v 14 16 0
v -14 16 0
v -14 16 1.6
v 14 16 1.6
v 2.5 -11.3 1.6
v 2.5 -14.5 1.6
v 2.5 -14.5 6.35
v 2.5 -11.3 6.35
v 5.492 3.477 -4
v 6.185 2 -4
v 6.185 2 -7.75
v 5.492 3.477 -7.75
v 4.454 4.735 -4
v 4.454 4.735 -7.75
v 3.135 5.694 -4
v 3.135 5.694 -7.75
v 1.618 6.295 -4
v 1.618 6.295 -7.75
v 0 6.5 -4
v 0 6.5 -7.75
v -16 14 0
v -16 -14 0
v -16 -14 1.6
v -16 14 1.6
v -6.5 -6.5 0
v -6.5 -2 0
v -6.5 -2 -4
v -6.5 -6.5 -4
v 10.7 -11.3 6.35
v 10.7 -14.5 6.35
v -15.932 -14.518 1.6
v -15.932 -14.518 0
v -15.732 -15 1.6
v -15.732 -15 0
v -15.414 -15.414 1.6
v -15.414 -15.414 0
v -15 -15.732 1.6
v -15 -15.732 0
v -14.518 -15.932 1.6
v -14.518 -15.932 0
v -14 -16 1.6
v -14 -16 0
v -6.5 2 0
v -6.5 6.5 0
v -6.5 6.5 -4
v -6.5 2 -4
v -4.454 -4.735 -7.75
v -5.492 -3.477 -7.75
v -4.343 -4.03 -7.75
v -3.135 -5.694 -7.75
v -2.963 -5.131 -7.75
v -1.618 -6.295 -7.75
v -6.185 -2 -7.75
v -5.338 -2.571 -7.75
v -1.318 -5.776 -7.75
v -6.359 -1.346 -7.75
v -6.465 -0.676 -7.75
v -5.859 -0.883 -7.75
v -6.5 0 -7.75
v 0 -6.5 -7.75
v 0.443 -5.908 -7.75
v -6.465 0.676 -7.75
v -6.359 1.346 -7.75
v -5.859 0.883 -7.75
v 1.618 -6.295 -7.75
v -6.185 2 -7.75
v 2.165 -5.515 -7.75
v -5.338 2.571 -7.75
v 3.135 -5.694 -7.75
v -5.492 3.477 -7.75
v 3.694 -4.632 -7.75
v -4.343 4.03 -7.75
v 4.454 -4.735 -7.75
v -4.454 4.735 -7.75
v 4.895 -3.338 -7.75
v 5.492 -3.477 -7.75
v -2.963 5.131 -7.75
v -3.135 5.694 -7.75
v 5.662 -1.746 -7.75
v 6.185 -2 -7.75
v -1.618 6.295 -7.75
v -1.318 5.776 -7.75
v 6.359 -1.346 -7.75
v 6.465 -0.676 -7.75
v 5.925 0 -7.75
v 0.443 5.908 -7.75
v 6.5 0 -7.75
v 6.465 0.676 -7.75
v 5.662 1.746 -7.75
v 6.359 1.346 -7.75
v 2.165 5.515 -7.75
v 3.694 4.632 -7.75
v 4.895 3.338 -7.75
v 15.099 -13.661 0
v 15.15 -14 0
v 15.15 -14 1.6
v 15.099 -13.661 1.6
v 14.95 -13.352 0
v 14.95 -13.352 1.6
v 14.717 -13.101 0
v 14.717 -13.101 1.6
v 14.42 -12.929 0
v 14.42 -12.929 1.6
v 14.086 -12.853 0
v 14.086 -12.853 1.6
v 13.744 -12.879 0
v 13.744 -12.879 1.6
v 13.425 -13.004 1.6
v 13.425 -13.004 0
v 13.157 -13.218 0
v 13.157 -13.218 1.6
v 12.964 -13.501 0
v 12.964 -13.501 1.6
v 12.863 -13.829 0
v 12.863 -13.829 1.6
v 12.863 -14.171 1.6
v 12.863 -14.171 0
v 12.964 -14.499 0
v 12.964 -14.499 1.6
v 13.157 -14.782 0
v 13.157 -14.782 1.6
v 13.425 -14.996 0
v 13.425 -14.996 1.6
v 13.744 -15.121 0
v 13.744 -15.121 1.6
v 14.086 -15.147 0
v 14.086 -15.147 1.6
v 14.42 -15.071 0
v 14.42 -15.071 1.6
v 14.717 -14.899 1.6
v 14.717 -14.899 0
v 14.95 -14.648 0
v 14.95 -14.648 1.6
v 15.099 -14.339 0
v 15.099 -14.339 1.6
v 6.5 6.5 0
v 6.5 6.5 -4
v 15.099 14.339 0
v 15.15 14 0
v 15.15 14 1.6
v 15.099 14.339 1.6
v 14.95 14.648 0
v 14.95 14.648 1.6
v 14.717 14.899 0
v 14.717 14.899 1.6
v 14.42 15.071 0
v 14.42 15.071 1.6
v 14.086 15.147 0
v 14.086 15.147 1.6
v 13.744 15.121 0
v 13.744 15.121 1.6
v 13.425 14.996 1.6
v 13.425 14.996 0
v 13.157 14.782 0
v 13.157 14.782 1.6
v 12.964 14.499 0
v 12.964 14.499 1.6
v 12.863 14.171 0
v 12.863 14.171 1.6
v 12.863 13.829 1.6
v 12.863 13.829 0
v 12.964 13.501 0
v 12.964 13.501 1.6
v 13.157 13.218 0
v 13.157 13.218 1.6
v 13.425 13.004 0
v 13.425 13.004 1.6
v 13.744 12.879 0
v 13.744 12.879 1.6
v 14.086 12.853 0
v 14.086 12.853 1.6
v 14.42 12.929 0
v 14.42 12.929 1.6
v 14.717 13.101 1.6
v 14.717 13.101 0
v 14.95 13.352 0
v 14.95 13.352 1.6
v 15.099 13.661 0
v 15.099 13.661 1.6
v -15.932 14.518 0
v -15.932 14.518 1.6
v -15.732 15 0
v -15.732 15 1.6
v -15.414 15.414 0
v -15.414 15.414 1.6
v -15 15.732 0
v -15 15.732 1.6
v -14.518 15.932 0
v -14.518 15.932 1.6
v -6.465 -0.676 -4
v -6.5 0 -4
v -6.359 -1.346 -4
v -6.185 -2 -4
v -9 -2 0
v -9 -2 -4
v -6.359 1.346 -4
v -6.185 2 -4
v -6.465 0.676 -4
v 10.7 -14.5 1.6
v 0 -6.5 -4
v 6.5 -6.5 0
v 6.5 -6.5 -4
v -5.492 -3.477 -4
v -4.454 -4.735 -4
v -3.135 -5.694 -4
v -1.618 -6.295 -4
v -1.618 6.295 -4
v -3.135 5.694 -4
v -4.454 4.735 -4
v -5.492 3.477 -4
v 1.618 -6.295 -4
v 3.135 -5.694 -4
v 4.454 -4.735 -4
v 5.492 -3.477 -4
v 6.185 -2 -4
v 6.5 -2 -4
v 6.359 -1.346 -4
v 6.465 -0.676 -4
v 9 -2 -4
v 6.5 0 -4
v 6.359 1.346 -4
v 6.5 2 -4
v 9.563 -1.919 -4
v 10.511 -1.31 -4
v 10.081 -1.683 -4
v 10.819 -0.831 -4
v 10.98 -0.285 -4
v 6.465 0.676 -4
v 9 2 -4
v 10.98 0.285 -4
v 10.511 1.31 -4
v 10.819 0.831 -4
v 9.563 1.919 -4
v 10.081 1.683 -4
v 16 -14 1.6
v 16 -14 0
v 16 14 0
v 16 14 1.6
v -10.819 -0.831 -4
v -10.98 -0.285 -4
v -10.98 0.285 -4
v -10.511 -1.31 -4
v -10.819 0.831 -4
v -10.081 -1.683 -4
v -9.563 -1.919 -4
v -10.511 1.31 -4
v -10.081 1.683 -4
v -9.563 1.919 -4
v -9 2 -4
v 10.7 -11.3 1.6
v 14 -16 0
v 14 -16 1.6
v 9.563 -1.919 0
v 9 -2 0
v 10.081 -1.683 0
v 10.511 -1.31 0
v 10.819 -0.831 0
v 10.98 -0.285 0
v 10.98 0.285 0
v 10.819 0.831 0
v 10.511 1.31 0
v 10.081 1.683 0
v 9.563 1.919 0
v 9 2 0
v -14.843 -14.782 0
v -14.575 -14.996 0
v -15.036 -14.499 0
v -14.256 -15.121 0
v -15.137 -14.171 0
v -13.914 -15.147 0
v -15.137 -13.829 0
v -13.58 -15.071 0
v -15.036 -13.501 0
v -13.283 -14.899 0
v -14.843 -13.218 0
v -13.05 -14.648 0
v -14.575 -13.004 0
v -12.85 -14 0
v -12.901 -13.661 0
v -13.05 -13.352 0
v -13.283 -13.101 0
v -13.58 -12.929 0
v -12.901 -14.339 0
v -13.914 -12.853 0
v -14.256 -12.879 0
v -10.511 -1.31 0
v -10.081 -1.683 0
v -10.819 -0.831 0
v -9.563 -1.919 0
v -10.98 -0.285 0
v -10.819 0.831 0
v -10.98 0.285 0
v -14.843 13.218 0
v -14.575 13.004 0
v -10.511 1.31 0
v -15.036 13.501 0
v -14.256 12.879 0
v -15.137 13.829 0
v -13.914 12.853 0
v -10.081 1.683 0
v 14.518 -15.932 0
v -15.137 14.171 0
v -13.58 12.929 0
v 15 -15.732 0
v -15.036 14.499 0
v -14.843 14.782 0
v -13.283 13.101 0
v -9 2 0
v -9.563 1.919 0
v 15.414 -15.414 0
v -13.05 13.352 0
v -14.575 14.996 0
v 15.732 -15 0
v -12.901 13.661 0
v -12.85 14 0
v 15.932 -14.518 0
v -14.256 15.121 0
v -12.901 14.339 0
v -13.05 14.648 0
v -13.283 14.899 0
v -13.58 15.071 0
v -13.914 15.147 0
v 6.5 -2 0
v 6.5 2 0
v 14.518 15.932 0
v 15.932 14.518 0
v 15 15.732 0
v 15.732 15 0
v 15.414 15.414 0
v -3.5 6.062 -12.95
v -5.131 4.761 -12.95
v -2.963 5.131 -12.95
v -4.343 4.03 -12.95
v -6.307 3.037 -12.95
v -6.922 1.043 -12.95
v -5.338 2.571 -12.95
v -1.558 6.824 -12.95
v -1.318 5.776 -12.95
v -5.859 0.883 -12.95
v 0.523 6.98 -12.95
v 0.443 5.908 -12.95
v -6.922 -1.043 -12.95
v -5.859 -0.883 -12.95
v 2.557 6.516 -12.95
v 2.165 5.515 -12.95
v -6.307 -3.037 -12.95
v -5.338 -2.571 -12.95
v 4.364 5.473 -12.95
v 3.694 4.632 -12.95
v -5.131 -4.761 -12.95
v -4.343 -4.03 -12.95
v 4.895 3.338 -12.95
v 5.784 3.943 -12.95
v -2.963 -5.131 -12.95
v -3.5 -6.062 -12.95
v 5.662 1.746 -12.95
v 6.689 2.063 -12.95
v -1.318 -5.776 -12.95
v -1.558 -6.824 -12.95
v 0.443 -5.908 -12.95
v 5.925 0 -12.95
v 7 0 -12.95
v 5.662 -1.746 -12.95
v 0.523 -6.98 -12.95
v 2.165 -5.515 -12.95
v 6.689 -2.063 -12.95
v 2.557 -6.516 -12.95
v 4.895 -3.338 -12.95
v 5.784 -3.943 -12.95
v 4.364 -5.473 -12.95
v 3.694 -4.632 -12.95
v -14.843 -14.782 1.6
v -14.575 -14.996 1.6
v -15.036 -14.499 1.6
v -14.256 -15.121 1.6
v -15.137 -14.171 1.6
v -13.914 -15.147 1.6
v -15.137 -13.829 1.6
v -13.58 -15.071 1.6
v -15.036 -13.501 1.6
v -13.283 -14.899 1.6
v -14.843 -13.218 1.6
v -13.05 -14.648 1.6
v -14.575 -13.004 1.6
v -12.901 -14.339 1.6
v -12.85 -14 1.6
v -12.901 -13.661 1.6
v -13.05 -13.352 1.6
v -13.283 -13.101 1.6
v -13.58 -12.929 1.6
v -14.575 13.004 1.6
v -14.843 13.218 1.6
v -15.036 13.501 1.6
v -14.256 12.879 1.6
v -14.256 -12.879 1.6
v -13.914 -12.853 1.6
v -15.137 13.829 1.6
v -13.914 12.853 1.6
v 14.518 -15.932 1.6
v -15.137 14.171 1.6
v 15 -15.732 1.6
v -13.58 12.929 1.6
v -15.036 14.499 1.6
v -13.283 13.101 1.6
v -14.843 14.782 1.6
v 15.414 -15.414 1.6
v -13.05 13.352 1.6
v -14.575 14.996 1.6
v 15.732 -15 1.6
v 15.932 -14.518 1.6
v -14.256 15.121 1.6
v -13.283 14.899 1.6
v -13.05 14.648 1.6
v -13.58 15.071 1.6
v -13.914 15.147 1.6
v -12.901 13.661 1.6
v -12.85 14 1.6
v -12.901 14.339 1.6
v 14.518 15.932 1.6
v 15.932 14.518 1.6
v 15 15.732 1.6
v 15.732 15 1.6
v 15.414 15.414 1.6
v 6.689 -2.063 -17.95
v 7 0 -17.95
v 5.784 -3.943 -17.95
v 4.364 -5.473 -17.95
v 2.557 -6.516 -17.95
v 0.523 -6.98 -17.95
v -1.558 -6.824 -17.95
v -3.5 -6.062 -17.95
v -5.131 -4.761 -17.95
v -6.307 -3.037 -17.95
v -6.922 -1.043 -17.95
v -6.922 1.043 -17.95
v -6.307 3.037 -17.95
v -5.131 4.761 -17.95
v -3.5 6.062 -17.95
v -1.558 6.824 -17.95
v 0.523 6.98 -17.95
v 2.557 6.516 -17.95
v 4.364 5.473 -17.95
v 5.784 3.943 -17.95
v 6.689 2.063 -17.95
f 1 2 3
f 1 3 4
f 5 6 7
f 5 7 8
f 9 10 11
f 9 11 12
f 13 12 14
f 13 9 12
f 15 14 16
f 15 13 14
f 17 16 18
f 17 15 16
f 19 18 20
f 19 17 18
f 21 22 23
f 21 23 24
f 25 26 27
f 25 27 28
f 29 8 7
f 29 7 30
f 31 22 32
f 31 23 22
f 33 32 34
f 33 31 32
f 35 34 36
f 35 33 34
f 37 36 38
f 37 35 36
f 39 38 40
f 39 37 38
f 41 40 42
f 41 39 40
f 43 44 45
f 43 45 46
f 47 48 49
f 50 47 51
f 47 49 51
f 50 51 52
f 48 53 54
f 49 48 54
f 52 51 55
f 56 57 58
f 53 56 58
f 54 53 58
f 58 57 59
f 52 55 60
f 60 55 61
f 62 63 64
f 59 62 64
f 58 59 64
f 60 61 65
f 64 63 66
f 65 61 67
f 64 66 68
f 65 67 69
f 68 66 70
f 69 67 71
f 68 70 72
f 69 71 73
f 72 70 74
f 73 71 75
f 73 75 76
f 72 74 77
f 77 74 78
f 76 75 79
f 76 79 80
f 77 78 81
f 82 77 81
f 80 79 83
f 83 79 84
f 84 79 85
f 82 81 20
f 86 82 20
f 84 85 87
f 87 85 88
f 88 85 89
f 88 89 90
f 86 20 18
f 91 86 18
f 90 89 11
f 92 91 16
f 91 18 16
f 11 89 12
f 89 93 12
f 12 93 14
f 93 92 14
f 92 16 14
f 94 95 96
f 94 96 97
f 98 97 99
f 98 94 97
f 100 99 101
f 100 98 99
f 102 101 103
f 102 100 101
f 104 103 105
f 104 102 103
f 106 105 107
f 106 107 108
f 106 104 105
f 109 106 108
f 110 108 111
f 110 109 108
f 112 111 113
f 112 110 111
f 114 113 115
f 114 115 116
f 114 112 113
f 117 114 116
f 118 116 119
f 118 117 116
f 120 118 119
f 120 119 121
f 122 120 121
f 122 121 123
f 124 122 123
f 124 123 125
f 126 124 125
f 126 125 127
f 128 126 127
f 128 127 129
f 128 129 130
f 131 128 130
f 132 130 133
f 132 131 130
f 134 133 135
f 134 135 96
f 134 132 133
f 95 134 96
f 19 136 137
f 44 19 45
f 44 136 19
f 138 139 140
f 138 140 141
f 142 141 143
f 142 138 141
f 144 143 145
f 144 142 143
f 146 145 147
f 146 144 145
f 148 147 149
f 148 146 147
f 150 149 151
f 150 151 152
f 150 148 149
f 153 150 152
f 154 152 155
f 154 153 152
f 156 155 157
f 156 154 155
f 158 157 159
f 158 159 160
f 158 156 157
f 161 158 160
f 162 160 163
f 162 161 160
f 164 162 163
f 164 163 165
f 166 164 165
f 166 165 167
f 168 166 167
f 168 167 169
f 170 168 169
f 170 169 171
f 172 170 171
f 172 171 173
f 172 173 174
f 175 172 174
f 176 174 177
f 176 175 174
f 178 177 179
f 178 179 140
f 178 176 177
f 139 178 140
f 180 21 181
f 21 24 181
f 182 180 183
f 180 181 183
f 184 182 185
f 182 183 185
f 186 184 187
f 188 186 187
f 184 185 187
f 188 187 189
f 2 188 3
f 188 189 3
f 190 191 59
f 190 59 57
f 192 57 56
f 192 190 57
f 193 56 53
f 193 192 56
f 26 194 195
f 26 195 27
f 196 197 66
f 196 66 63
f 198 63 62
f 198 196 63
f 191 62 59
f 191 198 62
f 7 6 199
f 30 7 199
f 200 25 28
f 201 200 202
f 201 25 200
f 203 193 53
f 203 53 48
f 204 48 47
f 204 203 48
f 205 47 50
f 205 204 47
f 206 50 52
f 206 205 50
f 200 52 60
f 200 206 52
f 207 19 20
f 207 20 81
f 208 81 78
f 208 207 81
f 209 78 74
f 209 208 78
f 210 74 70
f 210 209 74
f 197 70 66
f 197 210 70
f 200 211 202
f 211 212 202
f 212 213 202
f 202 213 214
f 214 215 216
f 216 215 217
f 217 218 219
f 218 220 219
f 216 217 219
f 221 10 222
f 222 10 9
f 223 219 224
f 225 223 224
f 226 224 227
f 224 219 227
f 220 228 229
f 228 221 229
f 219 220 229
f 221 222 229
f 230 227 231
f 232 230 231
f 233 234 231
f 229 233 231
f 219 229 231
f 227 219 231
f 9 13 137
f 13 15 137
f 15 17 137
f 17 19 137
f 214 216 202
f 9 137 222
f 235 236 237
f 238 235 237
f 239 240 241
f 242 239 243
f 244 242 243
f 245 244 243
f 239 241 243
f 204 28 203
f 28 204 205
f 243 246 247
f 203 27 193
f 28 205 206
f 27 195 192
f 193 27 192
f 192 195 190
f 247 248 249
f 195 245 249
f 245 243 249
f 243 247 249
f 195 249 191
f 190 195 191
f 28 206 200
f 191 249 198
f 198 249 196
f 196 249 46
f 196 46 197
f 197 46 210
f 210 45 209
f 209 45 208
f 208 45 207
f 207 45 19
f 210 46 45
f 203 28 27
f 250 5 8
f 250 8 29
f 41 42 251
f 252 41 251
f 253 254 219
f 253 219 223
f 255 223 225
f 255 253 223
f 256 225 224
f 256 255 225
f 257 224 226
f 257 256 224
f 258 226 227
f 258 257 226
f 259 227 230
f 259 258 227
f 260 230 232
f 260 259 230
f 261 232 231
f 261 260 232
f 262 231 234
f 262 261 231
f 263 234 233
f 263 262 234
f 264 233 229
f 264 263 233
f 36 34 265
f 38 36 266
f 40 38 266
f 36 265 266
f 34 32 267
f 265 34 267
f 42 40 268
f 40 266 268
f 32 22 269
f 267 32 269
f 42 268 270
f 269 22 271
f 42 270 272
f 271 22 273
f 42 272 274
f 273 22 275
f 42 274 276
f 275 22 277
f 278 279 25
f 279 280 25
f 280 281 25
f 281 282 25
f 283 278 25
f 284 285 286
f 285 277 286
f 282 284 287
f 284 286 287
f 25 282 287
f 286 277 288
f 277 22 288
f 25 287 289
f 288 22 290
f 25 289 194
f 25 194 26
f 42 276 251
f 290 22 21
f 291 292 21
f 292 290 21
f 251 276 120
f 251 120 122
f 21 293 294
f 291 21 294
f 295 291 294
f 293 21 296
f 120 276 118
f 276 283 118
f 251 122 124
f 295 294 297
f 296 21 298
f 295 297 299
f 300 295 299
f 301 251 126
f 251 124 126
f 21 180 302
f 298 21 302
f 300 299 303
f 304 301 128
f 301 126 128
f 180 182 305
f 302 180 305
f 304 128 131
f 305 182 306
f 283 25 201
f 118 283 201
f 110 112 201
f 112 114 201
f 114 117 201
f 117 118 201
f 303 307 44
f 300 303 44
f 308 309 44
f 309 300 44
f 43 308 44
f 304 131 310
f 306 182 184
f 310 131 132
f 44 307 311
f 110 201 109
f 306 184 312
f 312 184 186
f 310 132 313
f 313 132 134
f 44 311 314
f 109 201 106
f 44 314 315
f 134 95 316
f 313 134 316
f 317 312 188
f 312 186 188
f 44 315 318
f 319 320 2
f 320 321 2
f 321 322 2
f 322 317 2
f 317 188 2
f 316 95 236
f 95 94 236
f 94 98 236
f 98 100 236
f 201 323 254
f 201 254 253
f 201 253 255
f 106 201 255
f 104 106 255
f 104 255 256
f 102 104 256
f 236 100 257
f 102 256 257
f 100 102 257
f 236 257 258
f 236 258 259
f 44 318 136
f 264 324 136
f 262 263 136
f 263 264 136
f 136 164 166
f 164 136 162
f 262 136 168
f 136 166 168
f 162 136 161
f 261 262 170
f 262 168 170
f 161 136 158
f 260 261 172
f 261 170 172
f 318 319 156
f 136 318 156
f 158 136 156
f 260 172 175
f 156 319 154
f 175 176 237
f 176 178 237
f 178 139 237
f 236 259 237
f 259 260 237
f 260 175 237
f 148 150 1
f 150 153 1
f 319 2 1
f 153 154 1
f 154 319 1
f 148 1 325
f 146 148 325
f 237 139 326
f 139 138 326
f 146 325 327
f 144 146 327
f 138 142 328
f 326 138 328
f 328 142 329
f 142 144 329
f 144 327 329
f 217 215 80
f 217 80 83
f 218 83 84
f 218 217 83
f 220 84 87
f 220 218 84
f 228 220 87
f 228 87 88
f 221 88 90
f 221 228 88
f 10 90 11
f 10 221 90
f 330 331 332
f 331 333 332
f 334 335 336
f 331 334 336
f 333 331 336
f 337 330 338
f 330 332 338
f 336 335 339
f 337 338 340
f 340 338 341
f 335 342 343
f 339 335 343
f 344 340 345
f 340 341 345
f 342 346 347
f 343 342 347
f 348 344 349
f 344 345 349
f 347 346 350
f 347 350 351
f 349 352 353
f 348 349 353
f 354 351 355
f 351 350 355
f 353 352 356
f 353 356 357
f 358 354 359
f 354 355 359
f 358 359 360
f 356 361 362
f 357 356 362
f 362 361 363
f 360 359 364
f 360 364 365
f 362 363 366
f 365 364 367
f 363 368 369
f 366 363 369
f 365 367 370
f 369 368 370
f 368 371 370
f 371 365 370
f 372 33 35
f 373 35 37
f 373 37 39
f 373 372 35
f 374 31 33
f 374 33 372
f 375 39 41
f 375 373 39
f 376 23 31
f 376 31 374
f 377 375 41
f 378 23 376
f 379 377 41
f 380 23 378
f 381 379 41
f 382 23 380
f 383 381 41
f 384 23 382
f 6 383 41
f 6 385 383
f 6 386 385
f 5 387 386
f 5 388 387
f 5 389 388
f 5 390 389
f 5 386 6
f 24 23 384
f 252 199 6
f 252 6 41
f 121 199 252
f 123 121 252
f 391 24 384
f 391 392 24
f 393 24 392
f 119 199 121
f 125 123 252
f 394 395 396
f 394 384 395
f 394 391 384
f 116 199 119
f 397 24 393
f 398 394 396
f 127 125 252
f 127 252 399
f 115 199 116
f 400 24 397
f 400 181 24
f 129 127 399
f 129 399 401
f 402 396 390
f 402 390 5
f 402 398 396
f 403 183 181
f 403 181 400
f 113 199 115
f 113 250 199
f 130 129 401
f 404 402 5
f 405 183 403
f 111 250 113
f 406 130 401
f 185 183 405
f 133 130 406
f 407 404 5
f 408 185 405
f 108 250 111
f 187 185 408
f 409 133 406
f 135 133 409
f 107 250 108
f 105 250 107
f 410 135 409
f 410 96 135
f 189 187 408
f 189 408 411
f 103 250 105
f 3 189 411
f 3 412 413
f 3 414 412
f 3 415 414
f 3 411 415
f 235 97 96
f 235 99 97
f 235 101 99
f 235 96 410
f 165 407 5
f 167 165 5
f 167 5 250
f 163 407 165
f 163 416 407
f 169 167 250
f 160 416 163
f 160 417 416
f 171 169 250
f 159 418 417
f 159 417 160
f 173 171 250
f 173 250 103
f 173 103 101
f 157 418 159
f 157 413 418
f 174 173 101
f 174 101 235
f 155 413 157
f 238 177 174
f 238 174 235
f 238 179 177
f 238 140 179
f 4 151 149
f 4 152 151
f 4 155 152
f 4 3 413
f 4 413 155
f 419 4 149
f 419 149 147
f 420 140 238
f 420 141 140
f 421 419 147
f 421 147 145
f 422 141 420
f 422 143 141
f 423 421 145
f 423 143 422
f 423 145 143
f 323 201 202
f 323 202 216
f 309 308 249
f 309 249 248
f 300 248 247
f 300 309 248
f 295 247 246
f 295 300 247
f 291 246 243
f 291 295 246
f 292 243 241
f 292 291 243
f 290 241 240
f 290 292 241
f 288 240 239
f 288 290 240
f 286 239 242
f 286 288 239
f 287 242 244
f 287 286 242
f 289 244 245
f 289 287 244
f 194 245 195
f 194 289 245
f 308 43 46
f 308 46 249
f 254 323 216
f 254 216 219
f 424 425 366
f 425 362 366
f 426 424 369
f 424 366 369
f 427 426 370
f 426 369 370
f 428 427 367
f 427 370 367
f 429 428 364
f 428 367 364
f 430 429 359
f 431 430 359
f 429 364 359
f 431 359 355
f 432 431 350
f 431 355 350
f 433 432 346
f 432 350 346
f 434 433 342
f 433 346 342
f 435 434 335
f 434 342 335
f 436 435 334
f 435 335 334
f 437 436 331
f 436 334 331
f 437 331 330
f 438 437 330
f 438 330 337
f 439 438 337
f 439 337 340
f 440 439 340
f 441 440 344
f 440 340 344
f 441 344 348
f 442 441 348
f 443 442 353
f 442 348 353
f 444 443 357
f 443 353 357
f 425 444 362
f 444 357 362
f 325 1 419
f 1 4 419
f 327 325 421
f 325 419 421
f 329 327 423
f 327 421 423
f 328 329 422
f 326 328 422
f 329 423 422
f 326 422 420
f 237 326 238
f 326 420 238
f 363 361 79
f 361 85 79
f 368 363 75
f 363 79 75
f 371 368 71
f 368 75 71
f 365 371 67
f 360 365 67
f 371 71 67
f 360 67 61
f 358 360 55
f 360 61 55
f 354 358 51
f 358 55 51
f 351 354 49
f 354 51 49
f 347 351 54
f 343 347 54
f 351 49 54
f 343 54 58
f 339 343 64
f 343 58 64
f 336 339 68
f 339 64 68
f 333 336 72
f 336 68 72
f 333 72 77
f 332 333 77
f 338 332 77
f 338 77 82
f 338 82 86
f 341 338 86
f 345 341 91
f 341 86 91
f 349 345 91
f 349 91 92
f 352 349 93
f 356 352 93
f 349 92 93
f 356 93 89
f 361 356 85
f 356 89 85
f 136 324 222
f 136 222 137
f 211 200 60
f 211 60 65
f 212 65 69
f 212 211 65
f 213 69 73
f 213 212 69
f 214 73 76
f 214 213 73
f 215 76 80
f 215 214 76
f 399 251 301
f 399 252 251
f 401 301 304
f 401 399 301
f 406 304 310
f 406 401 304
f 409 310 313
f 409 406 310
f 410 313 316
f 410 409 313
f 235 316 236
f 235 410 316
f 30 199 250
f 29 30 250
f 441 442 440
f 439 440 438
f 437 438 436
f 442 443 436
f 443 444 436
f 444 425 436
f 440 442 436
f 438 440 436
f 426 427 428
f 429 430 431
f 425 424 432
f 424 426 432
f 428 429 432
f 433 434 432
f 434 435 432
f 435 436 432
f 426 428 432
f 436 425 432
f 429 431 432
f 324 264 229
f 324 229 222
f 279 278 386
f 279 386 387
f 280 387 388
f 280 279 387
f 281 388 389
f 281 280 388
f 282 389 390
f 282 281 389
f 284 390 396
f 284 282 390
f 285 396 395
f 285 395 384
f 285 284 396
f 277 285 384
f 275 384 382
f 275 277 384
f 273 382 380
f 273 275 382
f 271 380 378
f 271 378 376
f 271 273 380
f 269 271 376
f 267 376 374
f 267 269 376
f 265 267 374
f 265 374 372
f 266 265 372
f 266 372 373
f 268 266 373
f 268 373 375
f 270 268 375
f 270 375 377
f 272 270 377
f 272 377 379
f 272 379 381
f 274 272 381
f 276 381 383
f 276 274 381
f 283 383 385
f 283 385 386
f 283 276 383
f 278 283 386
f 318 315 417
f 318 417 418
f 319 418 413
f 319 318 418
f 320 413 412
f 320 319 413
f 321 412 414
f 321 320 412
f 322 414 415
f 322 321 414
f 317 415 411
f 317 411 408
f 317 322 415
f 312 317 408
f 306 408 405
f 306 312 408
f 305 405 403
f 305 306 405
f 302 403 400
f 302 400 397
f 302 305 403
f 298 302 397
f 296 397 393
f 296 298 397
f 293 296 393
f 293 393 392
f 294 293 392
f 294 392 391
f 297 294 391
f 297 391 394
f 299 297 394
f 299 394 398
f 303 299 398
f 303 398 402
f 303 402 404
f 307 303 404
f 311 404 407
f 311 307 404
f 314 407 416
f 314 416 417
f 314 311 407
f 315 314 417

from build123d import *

# Parameters (mm, degrees)
SKETCH1_W           = 32
SKETCH1_H           = 32
SKETCH1_R           = 1.15
BOSS_EXTRUDE1_DEPTH = 1.6
FILLET1_R           = 2
BOSS_EXTRUDE2_DEPTH = 4
SKETCH1_4_R         = 6.5
BOSS_EXTRUDE3_DEPTH = 7.75
SKETCH3_W           = 8.2
SKETCH3_H           = 3.2
BOSS_EXTRUDE4_DEPTH = 4.75


with BuildPart() as part:
    # Sketch1 → Boss-Extrude1 (new body)
    with BuildSketch(Plane.XY):
        Rectangle(SKETCH1_W, SKETCH1_H)
        with Locations((-14, -14)):
            Circle(SKETCH1_R, mode=Mode.SUBTRACT)
        with Locations((14, -14)):
            Circle(SKETCH1_R, mode=Mode.SUBTRACT)
        with Locations((-14, 14)):
            Circle(SKETCH1_R, mode=Mode.SUBTRACT)
        with Locations((14, 14)):
            Circle(SKETCH1_R, mode=Mode.SUBTRACT)
    extrude(amount=BOSS_EXTRUDE1_DEPTH)

    # Fillet1
    fillet1_edges = [part.edges().sort_by_distance(p)[0] for p in [
        (16, 16, 0.8),
        (16, -16, 0.8),
        (-16, -16, 0.8),
        (-16, 16, 0.8),
    ]]
    fillet(fillet1_edges, radius=FILLET1_R)

    # Sketch1<3> → Boss-Extrude2 (add)
    with BuildSketch(Plane.XY):
        with BuildLine():
            Line((6.5, -6.5), (6.5, -2))
            Line((6.5, -2), (9, -2))
            ThreePointArc((9, -2), (11, 0), (9, 2))
            Line((9, 2), (6.5, 2))
            Line((6.5, 2), (6.5, 6.5))
            Line((6.5, 6.5), (-6.5, 6.5))
            Line((-6.5, 6.5), (-6.5, 2))
            Line((-6.5, 2), (-9, 2))
            ThreePointArc((-9, 2), (-11, 0), (-9, -2))
            Line((-9, -2), (-6.5, -2))
            Line((-6.5, -2), (-6.5, -6.5))
            Line((-6.5, -6.5), (6.5, -6.5))
        make_face()
    extrude(amount=-BOSS_EXTRUDE2_DEPTH)

    # Sketch1<4> → Boss-Extrude3 (add)
    with BuildSketch(Plane.XY):
        Circle(SKETCH1_4_R)
    extrude(amount=-BOSS_EXTRUDE3_DEPTH)

    # Sketch2 → Revolve1 (revolve)
    with BuildSketch(Plane(origin=(0, 0, 0), x_dir=(0, 0, -1), z_dir=(1, 0, 0))):
        Polygon((17.95, 0), (17.95, 7), (12.95, 7), (12.95, 5.925), (7.75, 5.925), (7.75, 0), align=None)
    revolve(axis=Axis((0, 0, 0), (0, 0, -1)))

    # Sketch3 → Boss-Extrude4 (add)
    with BuildSketch(Plane.XY.offset(1.6)):
        with Locations((6.6, -12.9)):
            Rectangle(SKETCH3_W, SKETCH3_H)
    extrude(amount=BOSS_EXTRUDE4_DEPTH)


solid = part.part
